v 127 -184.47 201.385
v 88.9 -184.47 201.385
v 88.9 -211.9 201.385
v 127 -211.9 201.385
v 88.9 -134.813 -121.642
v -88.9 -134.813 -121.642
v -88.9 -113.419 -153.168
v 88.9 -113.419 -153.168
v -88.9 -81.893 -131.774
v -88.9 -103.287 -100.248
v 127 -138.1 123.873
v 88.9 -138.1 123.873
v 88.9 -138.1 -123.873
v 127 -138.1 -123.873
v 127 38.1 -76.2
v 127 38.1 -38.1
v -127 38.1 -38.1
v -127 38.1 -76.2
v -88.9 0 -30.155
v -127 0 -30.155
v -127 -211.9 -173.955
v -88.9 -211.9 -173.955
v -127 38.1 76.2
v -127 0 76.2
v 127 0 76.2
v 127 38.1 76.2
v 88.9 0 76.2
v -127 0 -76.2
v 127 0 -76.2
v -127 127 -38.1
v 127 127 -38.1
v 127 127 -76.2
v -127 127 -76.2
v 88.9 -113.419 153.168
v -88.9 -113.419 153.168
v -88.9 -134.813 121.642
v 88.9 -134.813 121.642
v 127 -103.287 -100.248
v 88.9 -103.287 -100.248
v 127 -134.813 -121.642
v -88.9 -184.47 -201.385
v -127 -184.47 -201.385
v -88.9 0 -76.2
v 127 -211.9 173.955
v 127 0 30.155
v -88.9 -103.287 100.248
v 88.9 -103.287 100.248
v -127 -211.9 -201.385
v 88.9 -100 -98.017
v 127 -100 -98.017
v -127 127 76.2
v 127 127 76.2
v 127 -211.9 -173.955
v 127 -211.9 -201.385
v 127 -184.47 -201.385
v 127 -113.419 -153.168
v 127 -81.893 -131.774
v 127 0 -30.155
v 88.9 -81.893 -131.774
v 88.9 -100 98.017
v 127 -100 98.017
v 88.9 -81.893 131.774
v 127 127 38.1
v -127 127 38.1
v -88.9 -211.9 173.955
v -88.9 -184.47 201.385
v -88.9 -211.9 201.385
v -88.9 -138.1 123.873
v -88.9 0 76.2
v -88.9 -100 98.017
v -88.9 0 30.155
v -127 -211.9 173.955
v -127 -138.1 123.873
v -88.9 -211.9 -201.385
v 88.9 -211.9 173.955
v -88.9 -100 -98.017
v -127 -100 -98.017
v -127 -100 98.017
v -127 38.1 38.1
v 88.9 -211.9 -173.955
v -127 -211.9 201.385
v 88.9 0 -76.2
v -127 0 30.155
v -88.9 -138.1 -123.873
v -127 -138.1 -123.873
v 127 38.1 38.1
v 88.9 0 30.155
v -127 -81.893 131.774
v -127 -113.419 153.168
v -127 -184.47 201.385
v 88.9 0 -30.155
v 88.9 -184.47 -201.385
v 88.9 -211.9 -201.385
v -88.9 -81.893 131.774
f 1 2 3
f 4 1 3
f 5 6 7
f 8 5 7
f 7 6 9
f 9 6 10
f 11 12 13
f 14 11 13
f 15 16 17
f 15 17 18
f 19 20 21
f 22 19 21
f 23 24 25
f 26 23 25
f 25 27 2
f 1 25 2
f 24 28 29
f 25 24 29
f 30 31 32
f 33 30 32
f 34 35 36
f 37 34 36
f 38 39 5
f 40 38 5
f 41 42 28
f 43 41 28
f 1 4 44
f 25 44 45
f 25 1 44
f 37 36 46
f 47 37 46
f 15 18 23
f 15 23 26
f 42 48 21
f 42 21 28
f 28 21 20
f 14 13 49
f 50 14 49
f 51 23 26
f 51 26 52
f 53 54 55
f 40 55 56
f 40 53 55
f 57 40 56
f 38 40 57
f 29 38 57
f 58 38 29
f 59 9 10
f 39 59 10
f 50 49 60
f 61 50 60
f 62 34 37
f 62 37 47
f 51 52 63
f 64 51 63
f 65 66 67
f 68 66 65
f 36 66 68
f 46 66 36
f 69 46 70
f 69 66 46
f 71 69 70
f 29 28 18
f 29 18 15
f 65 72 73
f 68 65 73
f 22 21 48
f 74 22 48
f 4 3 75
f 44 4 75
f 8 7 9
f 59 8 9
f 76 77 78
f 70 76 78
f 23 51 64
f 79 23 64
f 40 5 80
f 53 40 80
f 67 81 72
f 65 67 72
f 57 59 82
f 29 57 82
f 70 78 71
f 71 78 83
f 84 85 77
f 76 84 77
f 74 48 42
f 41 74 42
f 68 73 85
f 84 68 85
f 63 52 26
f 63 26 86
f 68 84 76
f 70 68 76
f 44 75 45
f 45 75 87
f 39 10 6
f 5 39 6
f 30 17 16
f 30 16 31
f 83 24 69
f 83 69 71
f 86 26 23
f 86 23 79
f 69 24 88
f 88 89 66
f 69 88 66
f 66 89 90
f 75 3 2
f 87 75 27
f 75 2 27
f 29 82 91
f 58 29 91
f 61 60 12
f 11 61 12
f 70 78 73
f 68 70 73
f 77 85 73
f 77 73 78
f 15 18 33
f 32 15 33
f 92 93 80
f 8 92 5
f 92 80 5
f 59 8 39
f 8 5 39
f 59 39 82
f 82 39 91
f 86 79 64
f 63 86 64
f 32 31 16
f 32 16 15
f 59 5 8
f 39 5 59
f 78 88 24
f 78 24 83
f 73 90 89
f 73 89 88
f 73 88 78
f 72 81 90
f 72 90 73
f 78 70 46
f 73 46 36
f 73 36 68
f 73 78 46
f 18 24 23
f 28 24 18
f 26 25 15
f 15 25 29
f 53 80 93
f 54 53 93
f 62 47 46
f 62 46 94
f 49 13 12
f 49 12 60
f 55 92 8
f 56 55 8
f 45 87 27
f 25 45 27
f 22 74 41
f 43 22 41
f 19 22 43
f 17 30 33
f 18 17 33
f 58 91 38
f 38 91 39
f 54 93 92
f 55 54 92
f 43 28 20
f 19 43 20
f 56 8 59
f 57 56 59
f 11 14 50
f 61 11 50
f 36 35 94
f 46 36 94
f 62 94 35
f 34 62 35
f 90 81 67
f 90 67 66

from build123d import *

# Parameters (mm, degrees)
SKETCH5_W             = 254
SKETCH5_H             = 152.4
BOSS_EXTRUDE4_DEPTH   = 38.1
BOSS_EXTRUDE3_DEPTH   = 38.1
BOSS_EXTRUDE5_DEPTH   = 254
SKETCH9_W             = 18.614651573
SKETCH9_H             = 27.430074188
CUT_EXTRUDE1_DEPTH    = 405
SPLIT1_OUTLINE_W      = 254
SPLIT1_OUTLINE_H      = 152.4
SPLIT1_DEPTH          = 38.1
SPLIT1_START          = -127
SPLIT1_2_DEPTH        = 38.1
SPLIT1_START_2        = 88.9
SPLIT1_3_DEPTH        = 38.1
SPLIT1_4_DEPTH        = 254
SPLIT1_5_DEPTH        = 254
SPLIT1_6_DEPTH        = 38.1
SPLIT1_7_DEPTH        = 38.1
SPLIT2_START          = -88.9
SPLIT2_DEPTH          = 177.8
SPLIT2_2_DEPTH        = 215.9
SPLIT2_START_2        = 88.9
SPLIT2_3_DEPTH        = 38.1
SPLIT2_4_DEPTH        = 177.8
SPLIT2_START_3        = -127
SPLIT2_5_DEPTH        = 38.1
SPLIT2_6_DEPTH        = 215.9
SKETCH10_W            = 38.1
SKETCH10_H            = 88.9
BOSS_EXTRUDE6_DEPTH   = 254
BOSS_EXTRUDE6_2_DEPTH = 254


# Read off the part's stored shape, not the designer's step: Split1, Split2
with BuildPart() as part:
    # Sketch5 → Boss-Extrude4 (new body)
    with BuildSketch(Plane(origin=(0, 0, 0), x_dir=(1, 0, 0), z_dir=(0, 1, 0))):
        Rectangle(SKETCH5_W, SKETCH5_H)
    extrude(amount=BOSS_EXTRUDE4_DEPTH)


with BuildPart() as body_2:
    # Sketch4 → Boss-Extrude3 (new body)
    with BuildSketch(Plane(origin=(127, 0, 0), x_dir=(0, 0, -1), z_dir=(1, 0, 0))):
        Polygon((0, 38.1), (-50.344502124, 38.1), (-220, -211.9), (-173.955274239, -211.9), (-123.872971266, -138.1), (0, -138.1), (0, -100), (-98.017473389, -100), (-30.155274239, 0), (0, 0), align=None)
    extrude(amount=-BOSS_EXTRUDE3_DEPTH)


with BuildPart() as body_3:
    # Mirror1: mirrored copy
    add(body_2.part.mirror(Plane(origin=(88.9, 0, 0), x_dir=(1, 0, 0), z_dir=(0, 0, -1))))


with BuildPart() as body_4:
    # Mirror2: mirrored copy
    add(body_3.part.mirror(Plane(origin=(0, 0, 0), x_dir=(0, 0, 1), z_dir=(1, 0, 0))))


with BuildPart() as body_5:
    # Mirror2 2: mirrored copy
    add(body_2.part.mirror(Plane(origin=(0, 0, 0), x_dir=(0, 0, 1), z_dir=(1, 0, 0))))


with BuildPart() as body_2_1:
    add(body_2.part)

    add(body_3.part)  # Boss-Extrude5 merges body 3

    add(body_4.part)  # Boss-Extrude5 merges body 4

    add(body_5.part)  # Boss-Extrude5 merges body 5
    # Sketch6 → Boss-Extrude5 (add)
    with BuildSketch(Plane(origin=(127, 0, 0), x_dir=(0, 0, -1), z_dir=(1, 0, 0))):
        Polygon((-131.774160921, -81.89266133), (-153.16845642, -113.418747673), (-121.642370077, -134.813043172), (-100.248074578, -103.286956828), align=None)
        Polygon((131.774160921, -81.89266133), (153.16845642, -113.418747673), (121.642370077, -134.813043172), (100.248074578, -103.286956828), align=None)
    extrude(amount=-BOSS_EXTRUDE5_DEPTH)


with BuildPart() as part_1:
    add(part.part)

    # Combine1: union body 2
    add(body_2_1.part)

    # Sketch9 → Cut-Extrude1 (cut)
    with BuildSketch(Plane.ZY.offset(127)):
        with Locations((-210.692674214, -198.184962906)):
            Rectangle(SKETCH9_W, SKETCH9_H)
        with Locations((210.692674214, -198.184962906)):
            Rectangle(SKETCH9_W, SKETCH9_H)
    extrude(amount=-CUT_EXTRUDE1_DEPTH, mode=Mode.SUBTRACT)

    # Split1 4 outline → Split1 4 (cut)
    with BuildSketch(Plane.YZ.offset(SPLIT1_START)):
        Polygon((38.1, 76.2), (0, 76.2), (0, -30.155274239), (-100, -98.017473389), (-100, 98.017473389), (-138.1, 123.872971266), (-138.1, -123.872971266), (-211.9, -173.955274239), (-211.9, -201.385348427), (-184.469925812, -201.385348427), (0, -76.2), (38.1, -76.2), align=None)
    extrude(amount=SPLIT1_4_DEPTH, mode=Mode.SUBTRACT)

    # Split2 2 outline → Split2 2 (cut)
    with BuildSketch(Plane.YZ.offset(SPLIT2_START)):
        Polygon((0, 30.155274239), (0, 76.2), (-184.469925812, 201.385348427), (-211.9, 201.385348427), (-211.9, 173.955274239), align=None)
    extrude(amount=SPLIT2_2_DEPTH, mode=Mode.SUBTRACT)


with BuildPart() as body_2_2:
    # Split1 outline → Split1 (new body)
    with BuildSketch(Plane(origin=(0, 0, 0), x_dir=(1, 0, 0), z_dir=(0, 1, 0))):
        Rectangle(SPLIT1_OUTLINE_W, SPLIT1_OUTLINE_H)
    extrude(amount=SPLIT1_DEPTH)


with BuildPart() as body_3_2:
    # Split1 2 outline → Split1 2 (new body)
    with BuildSketch(Plane.YZ.offset(SPLIT1_START)):
        Polygon((-138.1, -123.872971266), (-100, -98.017473389), (-100, 98.017473389), (-138.1, 123.872971266), align=None)
    extrude(amount=SPLIT1_2_DEPTH)


with BuildPart() as body_4_2:
    # Split1 3 outline → Split1 3 (new body)
    with BuildSketch(Plane.YZ.offset(SPLIT1_START_2)):
        Polygon((-138.1, -123.872971266), (-100, -98.017473389), (-100, 98.017473389), (-138.1, 123.872971266), align=None)
    extrude(amount=SPLIT1_3_DEPTH)


with BuildPart() as body_5_2:
    # Split1 5 outline → Split1 5 (new body)
    with BuildSketch(Plane.YZ.offset(SPLIT1_START)):
        Polygon((-81.89266133, -131.774160921), (-103.286956828, -100.248074578), (-134.813043172, -121.642370077), (-113.418747673, -153.16845642), align=None)
    extrude(amount=SPLIT1_5_DEPTH)

    # Split1 6 outline → Split1 6 (add)
    with BuildSketch(Plane.YZ.offset(SPLIT1_START)):
        Polygon((0, -76.2), (0, -30.155274239), (-103.286956828, -100.248074578), (-81.89266133, -131.774160921), align=None)
        Polygon((-113.418747673, -153.16845642), (-134.813043172, -121.642370077), (-211.9, -173.955274239), (-211.9, -201.385348427), (-184.469925812, -201.385348427), align=None)
    extrude(amount=SPLIT1_6_DEPTH)

    # Split1 7 outline → Split1 7 (add)
    with BuildSketch(Plane.YZ.offset(SPLIT1_START_2)):
        Polygon((0, -76.2), (0, -30.155274239), (-103.286956828, -100.248074578), (-81.89266133, -131.774160921), align=None)
        Polygon((-113.418747673, -153.16845642), (-134.813043172, -121.642370077), (-211.9, -173.955274239), (-211.9, -201.385348427), (-184.469925812, -201.385348427), align=None)
    extrude(amount=SPLIT1_7_DEPTH)

    # Split2 6 outline → Split2 6 (cut)
    with BuildSketch(Plane.YZ.offset(SPLIT2_START_3)):
        Polygon((0, -76.2), (0, -30.155274239), (-211.9, -173.955274239), (-211.9, -201.385348427), (-184.469925812, -201.385348427), align=None)
    extrude(amount=SPLIT2_6_DEPTH, mode=Mode.SUBTRACT)


with BuildPart() as body_6:
    # Split2 outline → Split2 (new body)
    with BuildSketch(Plane.YZ.offset(SPLIT2_START)):
        Polygon((-103.286956828, 100.248074578), (-81.89266133, 131.774160921), (-113.418747673, 153.16845642), (-134.813043172, 121.642370077), align=None)
    extrude(amount=SPLIT2_DEPTH)


with BuildPart() as body_7:
    # Split2 3 outline → Split2 3 (new body)
    with BuildSketch(Plane.YZ.offset(SPLIT2_START_2)):
        Polygon((-184.469925812, 201.385348427), (-211.9, 201.385348427), (-211.9, 173.955274239), (0, 30.155274239), (0, 76.2), align=None)
    extrude(amount=SPLIT2_3_DEPTH)


with BuildPart() as body_8:
    # Split2 4 outline → Split2 4 (new body)
    with BuildSketch(Plane.YZ.offset(SPLIT2_START)):
        Polygon((-134.813043172, -121.642370077), (-113.418747673, -153.16845642), (-81.89266133, -131.774160921), (-103.286956828, -100.248074578), align=None)
    extrude(amount=SPLIT2_4_DEPTH)


with BuildPart() as body_9:
    # Split2 5 outline → Split2 5 (new body)
    with BuildSketch(Plane.YZ.offset(SPLIT2_START_3)):
        Polygon((0, -76.2), (0, -30.155274239), (-211.9, -173.955274239), (-211.9, -201.385348427), (-184.469925812, -201.385348427), align=None)
    extrude(amount=SPLIT2_5_DEPTH)


with BuildPart() as body_10:
    # Sketch10 → Boss-Extrude6 (new body)
    with BuildSketch(Plane(origin=(127, 0, 0), x_dir=(0, 0, -1), z_dir=(1, 0, 0))):
        with Locations((-57.15, 82.55)):
            Rectangle(SKETCH10_W, SKETCH10_H)
    extrude(amount=-BOSS_EXTRUDE6_DEPTH)


with BuildPart() as body_11:
    # Sketch10 → Boss-Extrude6 2 (new body)
    with BuildSketch(Plane(origin=(127, 0, 0), x_dir=(0, 0, -1), z_dir=(1, 0, 0))):
        with Locations((57.15, 82.55)):
            Rectangle(SKETCH10_W, SKETCH10_H)
    extrude(amount=-BOSS_EXTRUDE6_2_DEPTH)


solid = Compound([part_1.part, body_2_2.part, body_3_2.part, body_4_2.part, body_5_2.part, body_6.part, body_7.part, body_8.part, body_9.part, body_10.part, body_11.part])
